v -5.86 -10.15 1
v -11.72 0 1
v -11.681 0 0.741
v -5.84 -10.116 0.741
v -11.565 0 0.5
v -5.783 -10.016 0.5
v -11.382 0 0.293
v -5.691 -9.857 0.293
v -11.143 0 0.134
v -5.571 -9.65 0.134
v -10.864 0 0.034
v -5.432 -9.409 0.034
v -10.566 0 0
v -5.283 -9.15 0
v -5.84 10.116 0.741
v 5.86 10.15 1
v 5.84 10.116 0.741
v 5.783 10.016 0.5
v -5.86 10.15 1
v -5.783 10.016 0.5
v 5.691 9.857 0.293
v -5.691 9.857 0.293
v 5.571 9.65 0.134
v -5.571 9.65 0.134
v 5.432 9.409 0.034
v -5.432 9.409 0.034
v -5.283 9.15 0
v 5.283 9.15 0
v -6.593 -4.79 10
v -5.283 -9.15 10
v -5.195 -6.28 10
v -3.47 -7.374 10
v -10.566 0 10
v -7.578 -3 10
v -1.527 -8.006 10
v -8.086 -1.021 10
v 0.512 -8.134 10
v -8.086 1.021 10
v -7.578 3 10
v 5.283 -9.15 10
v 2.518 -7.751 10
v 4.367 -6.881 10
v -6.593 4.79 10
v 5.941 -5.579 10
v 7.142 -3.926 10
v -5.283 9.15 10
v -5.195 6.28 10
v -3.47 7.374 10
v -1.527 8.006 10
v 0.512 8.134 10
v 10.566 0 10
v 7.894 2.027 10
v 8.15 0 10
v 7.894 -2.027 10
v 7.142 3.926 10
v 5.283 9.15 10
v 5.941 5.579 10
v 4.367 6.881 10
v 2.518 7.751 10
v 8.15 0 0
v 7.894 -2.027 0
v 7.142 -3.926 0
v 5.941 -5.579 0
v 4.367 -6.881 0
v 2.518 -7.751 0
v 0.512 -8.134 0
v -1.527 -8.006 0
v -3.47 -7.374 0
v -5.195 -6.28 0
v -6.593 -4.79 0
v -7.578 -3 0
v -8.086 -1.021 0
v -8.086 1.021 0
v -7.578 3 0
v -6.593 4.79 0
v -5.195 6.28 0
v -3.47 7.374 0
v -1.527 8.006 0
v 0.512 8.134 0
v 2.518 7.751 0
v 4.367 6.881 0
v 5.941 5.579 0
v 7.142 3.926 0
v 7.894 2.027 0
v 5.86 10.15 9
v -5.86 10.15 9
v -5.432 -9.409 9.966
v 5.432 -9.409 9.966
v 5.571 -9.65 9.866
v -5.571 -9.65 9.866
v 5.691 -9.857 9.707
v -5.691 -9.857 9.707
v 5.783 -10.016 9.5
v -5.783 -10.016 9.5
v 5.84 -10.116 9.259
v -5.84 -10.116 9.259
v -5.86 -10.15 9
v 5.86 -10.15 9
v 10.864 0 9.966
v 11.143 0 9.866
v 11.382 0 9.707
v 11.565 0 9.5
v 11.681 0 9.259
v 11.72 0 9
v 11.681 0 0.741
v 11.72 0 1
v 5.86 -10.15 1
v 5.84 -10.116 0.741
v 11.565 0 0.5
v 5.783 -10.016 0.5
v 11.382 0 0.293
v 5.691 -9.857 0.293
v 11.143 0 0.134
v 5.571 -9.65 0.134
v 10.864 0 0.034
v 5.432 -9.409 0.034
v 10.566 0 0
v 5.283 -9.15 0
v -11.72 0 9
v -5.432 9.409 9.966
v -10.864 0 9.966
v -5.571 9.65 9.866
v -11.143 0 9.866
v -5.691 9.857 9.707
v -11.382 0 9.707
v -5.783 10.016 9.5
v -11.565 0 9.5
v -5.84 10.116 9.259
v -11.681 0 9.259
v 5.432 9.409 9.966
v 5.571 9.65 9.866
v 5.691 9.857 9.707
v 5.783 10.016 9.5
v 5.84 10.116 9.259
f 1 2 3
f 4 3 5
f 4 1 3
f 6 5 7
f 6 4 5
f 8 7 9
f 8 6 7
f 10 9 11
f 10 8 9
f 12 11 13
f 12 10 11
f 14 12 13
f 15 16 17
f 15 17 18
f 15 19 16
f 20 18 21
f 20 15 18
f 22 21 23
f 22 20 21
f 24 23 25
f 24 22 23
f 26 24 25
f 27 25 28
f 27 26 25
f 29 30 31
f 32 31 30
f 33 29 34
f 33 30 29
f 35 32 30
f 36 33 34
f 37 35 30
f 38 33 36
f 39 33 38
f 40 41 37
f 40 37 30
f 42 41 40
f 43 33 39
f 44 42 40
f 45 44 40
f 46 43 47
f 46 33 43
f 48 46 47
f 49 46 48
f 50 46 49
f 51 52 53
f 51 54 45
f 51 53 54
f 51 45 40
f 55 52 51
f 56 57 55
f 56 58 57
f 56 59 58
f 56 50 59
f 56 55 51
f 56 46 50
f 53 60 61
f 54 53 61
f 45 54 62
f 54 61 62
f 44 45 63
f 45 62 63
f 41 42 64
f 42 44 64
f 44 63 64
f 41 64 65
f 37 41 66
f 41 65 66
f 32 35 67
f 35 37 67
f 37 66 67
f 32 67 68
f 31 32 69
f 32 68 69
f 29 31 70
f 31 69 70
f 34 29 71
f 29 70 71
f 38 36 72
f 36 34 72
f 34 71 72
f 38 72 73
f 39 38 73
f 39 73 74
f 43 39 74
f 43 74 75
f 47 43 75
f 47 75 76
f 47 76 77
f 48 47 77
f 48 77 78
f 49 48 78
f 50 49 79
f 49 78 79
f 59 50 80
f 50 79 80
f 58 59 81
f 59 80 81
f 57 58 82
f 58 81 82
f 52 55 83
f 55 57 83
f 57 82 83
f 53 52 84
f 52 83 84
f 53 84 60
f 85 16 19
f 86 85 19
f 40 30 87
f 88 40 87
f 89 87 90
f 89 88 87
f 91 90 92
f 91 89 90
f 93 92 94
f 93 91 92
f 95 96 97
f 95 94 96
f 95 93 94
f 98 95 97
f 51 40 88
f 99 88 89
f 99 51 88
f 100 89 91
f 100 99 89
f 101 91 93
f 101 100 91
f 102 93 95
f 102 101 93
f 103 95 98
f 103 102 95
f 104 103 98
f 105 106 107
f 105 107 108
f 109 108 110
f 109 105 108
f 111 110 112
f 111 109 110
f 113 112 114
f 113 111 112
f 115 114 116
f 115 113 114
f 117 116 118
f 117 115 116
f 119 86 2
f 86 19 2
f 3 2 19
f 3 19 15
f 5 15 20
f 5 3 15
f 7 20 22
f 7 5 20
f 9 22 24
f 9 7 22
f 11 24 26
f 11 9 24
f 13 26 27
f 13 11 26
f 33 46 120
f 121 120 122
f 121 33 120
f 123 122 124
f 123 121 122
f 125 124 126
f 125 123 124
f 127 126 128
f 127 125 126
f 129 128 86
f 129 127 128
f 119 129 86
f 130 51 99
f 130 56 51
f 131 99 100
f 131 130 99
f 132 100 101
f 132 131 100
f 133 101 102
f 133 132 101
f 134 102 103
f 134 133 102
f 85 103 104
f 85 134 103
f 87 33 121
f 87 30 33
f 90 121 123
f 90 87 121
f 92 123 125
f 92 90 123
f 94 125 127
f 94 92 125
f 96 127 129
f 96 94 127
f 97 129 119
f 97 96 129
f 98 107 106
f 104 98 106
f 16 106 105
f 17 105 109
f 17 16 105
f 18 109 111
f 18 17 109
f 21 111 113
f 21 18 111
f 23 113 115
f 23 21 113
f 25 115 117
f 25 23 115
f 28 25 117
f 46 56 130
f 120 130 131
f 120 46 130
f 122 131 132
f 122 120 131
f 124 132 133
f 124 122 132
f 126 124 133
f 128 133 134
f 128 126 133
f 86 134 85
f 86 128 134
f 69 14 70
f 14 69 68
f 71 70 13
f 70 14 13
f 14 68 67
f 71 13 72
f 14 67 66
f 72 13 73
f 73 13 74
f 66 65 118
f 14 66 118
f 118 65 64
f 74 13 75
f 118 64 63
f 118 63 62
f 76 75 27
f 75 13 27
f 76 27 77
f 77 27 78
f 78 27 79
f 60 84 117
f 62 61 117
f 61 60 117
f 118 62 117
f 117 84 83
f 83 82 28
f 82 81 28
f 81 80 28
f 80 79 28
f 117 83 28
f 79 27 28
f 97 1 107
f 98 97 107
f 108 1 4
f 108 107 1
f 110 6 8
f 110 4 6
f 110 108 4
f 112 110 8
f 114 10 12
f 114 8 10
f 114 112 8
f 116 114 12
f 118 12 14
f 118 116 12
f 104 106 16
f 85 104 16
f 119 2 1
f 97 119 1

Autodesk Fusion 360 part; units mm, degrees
sketch "Sketch1" plane through (0, 0, 0) normal (0, 0, 1) x (1, 0, 0)
  circle A0 centre (0, 0) radius 8.15
  circle A1 centre (0, 0) radius 9.15 construction
  circle A2 centre (0, 0) radius 10.15 construction
  line L0 (-5.8601, 10.15) -> (-11.7202, 0)
  line L1 (-11.7202, 0) -> (-5.8601, -10.15)
  line L2 (-5.8601, -10.15) -> (5.8601, -10.15)
  line L3 (5.8601, -10.15) -> (11.7202, 0)
  line L4 (11.7202, 0) -> (5.8601, 10.15)
  line L5 (5.8601, 10.15) -> (-5.8601, 10.15)
  dimension "d1" = 16.3
  dimension "d2" = 1
  dimension "d3" = 2
extrude "Extrude1" add sketch "Sketch1" along normal blind 10
fillet "Fillet1" radius 1 6 edges at (-8.7902, 5.075, 10) (-8.7902, -5.075, 10) (0, -10.15, 10) (8.7902, -5.075, 10) (8.7902, 5.075, 10) (0, 10.15, 10)
fillet "Fillet2" radius 1 6 edges at (0, 10.15, 0) (8.7902, 5.075, 0) (8.7902, -5.075, 0) (0, -10.15, 0) (-8.7902, -5.075, 0) (-8.7902, 5.075, 0)
thread "Thread1"
